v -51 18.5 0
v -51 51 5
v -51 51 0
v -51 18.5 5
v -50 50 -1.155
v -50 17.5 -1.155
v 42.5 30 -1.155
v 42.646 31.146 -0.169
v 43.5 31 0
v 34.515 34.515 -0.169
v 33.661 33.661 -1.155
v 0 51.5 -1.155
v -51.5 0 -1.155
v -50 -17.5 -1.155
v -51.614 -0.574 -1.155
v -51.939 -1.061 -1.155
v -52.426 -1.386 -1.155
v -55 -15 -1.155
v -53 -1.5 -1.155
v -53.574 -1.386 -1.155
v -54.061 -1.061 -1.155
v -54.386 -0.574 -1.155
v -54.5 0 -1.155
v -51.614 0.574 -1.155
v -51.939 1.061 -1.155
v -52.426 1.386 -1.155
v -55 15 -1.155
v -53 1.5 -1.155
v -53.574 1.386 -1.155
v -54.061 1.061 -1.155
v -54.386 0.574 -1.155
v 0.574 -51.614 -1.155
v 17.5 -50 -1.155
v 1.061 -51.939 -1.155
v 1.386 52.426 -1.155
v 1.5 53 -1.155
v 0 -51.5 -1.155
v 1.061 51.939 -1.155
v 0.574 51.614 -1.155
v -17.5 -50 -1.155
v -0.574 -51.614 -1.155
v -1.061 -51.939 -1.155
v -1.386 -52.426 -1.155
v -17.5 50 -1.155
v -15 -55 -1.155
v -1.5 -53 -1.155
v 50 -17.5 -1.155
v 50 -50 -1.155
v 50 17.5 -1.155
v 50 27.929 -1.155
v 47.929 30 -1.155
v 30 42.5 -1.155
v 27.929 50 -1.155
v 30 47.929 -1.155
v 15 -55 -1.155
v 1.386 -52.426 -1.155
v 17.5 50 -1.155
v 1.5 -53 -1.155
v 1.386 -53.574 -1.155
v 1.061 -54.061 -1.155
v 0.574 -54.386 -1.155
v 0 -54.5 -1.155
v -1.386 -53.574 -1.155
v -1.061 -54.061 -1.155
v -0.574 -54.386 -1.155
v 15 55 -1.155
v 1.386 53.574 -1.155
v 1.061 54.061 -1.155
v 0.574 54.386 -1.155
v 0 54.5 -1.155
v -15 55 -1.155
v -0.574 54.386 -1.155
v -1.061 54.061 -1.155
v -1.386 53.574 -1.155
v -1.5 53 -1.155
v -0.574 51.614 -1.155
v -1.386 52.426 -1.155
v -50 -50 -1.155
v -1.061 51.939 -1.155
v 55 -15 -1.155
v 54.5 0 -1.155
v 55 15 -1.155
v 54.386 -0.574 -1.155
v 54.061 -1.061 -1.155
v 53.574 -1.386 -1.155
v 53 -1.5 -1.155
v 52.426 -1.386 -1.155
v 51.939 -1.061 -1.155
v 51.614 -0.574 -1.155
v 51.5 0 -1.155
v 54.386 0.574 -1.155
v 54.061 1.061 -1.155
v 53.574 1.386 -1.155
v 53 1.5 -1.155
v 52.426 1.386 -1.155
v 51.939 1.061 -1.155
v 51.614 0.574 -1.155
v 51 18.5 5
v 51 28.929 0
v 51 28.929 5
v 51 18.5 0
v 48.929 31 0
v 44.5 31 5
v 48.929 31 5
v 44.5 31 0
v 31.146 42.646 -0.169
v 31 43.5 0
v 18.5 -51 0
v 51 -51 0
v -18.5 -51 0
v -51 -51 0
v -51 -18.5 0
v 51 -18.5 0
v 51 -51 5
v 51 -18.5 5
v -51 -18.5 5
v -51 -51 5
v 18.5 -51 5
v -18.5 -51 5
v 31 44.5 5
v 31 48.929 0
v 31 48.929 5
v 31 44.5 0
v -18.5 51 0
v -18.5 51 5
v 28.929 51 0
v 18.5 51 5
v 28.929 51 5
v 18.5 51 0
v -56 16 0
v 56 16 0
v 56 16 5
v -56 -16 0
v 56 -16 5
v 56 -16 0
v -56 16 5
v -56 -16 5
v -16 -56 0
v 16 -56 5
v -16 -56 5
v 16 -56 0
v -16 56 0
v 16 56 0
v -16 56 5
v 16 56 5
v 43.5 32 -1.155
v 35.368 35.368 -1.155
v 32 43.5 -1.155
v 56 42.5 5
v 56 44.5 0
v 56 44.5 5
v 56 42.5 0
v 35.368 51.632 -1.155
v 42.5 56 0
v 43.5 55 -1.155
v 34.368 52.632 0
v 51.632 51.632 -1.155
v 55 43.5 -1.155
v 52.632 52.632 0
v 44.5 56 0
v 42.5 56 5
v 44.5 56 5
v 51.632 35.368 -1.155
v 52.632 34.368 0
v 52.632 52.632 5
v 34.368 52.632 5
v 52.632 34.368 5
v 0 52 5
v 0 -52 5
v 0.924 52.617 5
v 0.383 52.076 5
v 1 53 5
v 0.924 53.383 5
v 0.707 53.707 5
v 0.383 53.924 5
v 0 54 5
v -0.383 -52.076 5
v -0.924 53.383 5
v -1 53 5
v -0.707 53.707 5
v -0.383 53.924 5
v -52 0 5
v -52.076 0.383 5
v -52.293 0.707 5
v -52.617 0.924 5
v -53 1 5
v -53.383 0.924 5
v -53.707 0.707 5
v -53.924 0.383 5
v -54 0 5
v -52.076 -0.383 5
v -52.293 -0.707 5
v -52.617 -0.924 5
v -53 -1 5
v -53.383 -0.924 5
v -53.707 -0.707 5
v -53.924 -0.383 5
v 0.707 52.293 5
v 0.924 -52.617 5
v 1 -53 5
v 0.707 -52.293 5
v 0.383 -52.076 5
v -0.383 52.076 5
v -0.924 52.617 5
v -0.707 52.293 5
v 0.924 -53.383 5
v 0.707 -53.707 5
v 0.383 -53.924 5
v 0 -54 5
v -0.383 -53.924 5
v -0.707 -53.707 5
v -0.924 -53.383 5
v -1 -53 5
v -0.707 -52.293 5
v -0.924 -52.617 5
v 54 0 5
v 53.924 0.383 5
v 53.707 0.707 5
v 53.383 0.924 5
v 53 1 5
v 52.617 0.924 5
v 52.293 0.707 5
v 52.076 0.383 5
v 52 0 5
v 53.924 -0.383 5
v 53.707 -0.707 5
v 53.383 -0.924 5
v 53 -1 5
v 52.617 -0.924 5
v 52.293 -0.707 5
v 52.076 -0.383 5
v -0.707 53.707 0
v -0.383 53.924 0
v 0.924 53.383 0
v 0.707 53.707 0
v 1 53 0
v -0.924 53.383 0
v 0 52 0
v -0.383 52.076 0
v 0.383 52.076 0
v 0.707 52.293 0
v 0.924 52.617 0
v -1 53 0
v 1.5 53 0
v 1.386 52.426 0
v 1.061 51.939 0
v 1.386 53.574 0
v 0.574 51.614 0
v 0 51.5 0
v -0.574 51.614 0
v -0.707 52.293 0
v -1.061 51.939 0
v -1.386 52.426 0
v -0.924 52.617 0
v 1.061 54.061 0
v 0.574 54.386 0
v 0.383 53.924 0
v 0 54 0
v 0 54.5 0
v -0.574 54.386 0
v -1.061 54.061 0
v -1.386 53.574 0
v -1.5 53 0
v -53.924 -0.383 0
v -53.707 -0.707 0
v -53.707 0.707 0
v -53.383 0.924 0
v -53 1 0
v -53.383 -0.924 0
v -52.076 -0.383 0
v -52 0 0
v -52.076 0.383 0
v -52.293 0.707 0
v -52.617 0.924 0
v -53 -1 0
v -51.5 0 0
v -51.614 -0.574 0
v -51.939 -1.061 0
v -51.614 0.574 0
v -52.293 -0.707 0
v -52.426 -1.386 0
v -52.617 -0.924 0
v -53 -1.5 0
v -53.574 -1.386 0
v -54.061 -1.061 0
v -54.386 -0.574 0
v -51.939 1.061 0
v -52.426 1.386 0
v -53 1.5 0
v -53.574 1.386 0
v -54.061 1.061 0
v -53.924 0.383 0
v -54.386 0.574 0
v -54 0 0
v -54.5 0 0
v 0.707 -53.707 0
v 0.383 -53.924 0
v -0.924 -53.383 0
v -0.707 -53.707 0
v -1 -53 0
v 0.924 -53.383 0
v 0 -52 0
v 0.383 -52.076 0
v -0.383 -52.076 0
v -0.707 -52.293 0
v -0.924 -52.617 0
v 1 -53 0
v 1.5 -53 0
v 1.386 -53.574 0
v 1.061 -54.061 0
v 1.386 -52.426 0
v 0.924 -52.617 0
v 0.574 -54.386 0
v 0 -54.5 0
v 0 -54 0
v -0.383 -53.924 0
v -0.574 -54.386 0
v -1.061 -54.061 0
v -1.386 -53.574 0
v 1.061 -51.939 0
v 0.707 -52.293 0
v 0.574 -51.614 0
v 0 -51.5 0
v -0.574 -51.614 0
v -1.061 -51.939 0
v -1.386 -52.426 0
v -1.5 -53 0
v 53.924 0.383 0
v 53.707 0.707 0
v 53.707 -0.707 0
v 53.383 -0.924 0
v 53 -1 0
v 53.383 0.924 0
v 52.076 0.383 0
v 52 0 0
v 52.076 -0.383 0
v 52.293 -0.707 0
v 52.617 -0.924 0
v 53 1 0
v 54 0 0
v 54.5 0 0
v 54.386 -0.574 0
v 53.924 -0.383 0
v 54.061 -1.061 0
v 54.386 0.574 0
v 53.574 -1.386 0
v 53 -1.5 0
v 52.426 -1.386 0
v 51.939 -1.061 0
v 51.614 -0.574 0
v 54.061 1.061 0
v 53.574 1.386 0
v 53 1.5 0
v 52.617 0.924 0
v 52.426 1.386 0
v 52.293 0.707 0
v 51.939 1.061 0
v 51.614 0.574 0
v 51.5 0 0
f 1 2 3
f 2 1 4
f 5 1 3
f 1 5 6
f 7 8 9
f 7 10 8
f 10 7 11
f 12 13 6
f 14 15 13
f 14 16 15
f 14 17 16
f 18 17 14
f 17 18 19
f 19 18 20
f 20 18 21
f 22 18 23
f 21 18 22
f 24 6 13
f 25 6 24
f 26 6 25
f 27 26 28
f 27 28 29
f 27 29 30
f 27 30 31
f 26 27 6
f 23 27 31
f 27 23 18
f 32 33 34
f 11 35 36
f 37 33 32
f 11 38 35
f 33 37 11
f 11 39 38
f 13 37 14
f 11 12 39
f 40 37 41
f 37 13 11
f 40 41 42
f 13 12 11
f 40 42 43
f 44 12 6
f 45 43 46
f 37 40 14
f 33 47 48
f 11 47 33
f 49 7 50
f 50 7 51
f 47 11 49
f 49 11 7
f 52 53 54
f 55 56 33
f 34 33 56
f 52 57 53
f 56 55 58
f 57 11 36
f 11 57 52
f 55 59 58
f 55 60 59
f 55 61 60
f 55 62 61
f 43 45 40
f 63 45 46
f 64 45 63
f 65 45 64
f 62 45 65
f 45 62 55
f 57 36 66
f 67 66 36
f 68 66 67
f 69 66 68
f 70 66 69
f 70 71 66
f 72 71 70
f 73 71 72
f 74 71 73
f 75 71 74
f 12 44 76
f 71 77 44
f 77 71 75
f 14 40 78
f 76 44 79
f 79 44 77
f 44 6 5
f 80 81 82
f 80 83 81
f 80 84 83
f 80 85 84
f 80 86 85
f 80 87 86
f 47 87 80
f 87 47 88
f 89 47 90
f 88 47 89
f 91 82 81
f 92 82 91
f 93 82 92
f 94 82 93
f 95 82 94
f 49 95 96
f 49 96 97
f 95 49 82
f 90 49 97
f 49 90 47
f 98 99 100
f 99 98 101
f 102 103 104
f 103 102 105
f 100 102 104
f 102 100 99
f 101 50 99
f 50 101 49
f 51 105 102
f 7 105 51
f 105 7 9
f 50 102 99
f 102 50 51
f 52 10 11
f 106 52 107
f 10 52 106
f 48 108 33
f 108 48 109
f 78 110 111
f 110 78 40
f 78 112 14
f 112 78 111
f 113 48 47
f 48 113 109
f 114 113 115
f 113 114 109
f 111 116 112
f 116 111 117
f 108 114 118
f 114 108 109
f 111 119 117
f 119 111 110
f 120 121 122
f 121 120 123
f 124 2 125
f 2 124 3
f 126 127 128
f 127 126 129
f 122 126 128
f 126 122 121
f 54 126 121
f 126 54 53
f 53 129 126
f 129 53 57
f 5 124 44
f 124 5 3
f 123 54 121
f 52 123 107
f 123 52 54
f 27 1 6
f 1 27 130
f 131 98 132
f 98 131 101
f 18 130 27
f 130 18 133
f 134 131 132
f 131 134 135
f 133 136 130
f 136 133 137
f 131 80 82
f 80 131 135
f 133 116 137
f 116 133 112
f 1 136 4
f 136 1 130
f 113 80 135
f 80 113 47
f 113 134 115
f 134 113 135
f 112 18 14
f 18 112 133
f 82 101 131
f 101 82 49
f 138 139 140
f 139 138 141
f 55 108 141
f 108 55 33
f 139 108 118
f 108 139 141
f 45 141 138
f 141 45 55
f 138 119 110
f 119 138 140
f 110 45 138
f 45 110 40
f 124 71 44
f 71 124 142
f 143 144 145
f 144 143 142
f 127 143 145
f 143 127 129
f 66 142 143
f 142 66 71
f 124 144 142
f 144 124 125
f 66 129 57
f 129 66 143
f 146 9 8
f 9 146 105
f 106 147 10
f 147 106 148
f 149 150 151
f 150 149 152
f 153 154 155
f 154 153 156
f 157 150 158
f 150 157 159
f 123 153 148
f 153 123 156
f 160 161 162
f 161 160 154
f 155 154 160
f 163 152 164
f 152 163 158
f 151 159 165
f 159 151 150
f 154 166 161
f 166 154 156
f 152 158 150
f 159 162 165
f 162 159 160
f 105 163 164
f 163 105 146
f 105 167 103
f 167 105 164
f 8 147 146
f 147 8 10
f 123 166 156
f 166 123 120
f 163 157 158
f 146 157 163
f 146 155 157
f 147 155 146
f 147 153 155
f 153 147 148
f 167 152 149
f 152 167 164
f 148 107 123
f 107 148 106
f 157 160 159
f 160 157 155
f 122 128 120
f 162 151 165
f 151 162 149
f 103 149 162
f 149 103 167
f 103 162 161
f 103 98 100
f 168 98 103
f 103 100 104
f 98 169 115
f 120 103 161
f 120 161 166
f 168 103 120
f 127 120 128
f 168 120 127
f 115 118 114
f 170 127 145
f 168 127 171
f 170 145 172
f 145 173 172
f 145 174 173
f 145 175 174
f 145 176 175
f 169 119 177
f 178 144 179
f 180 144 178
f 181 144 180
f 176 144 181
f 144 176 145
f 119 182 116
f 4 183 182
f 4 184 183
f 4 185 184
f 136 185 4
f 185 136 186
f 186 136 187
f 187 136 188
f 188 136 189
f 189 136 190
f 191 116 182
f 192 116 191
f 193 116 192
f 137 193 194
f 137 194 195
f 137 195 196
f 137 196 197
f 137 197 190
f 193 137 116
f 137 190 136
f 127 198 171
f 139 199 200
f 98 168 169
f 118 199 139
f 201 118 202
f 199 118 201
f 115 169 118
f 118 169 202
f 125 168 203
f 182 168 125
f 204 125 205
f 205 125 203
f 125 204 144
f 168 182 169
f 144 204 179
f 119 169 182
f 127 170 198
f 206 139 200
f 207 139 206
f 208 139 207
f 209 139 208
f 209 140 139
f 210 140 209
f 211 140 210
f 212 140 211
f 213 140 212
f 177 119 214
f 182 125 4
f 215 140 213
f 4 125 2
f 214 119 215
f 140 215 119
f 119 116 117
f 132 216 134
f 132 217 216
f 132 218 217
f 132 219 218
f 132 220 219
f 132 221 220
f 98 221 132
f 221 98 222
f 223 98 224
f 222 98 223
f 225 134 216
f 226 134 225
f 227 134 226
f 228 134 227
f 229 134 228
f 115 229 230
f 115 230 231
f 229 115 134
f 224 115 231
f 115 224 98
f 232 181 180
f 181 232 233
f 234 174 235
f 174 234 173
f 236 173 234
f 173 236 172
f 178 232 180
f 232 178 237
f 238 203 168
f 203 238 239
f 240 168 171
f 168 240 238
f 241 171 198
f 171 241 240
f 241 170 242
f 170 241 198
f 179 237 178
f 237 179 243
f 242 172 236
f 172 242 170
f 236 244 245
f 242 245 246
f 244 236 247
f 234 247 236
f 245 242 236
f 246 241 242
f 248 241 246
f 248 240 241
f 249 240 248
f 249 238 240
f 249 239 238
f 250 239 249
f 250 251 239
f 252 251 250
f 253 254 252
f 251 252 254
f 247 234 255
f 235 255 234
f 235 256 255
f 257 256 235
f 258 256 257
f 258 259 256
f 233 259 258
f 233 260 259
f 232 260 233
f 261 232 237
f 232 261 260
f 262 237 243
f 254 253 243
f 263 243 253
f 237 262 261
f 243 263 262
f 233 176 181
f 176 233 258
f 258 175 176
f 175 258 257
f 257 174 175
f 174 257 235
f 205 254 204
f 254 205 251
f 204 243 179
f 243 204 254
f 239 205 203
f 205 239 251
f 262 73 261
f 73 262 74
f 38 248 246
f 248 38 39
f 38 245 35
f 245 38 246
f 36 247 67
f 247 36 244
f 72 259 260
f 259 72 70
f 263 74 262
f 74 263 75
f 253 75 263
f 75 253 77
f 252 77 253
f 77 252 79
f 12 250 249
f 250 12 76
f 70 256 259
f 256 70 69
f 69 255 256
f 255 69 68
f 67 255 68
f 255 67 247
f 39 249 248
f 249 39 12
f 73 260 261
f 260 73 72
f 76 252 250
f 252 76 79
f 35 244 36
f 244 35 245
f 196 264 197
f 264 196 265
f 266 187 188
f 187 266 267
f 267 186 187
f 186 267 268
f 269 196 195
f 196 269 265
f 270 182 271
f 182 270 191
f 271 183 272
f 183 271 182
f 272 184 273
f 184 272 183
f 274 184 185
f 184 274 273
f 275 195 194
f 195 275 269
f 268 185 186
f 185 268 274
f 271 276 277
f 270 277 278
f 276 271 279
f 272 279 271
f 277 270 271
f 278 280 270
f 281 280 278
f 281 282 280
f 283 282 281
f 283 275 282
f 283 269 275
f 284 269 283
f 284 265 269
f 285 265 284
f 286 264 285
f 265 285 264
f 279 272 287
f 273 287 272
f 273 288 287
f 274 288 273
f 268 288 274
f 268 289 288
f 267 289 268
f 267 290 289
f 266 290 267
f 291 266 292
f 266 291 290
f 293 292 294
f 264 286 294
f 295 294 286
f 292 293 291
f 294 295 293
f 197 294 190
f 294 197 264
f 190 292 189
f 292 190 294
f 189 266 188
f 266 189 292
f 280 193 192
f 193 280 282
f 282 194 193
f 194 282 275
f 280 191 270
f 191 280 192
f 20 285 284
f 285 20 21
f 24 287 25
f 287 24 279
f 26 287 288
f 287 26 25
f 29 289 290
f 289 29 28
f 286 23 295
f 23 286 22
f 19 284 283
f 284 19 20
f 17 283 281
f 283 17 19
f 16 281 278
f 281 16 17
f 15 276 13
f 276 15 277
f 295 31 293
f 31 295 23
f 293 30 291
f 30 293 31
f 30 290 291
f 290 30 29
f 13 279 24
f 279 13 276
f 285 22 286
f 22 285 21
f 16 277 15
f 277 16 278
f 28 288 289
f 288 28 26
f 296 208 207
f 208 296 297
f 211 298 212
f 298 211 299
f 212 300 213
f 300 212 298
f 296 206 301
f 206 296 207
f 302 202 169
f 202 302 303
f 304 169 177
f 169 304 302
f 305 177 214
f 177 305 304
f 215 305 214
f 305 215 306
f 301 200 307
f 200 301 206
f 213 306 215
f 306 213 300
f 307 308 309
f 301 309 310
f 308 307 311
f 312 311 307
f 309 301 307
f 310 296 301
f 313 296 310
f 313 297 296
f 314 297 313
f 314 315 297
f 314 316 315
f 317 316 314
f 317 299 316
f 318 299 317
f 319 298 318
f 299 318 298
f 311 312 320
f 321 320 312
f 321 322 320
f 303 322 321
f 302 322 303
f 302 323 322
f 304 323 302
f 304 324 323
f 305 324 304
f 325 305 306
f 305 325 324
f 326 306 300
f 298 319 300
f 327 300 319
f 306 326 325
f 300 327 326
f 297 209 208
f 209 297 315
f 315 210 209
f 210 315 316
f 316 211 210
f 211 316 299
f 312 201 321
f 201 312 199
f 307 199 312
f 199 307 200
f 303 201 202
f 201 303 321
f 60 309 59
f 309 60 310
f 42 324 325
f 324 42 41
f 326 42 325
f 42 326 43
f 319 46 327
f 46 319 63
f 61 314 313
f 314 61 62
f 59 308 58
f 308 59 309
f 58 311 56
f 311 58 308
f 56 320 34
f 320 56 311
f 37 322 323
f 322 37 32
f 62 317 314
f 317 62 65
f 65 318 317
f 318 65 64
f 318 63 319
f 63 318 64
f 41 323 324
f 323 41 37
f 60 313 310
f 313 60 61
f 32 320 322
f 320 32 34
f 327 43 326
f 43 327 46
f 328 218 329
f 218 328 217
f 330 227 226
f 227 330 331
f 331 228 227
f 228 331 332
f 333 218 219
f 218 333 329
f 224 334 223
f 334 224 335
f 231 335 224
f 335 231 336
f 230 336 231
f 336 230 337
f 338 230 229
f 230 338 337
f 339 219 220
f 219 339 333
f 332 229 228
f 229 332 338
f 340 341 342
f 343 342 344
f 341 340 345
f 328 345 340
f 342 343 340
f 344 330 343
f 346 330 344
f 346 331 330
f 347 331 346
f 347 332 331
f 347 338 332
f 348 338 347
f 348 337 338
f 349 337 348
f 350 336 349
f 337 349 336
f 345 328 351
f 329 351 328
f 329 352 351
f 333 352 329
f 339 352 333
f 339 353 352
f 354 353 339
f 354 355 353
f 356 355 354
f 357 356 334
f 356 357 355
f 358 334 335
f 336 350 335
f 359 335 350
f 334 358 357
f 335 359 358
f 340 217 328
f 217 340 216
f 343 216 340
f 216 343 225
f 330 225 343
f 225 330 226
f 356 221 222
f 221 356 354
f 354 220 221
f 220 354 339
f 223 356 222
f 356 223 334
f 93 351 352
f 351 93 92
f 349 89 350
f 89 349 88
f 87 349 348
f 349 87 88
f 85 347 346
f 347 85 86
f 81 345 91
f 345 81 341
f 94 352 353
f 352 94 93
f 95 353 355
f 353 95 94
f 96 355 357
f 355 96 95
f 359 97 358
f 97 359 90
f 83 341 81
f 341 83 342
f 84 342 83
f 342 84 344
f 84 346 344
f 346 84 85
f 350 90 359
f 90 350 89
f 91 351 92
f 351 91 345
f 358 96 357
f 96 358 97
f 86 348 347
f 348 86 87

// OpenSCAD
// UBomb

module_l = 100;
module_d = 30;
module_indent_w = 30;
module_indent_d = 5;
module_lighit_d = 25;
module_lighit_cut = 5;
module_internal_wall = 5;

moudle_light_d_1 = 25;
moudle_light_d_2 = 10;
moudle_light_reduction = 0.7;
moudle_light_diamater = 7;

module_screw_cap_d = 5;

rounding = 2;

light_center = module_l/2 + module_indent_d - module_lighit_d/2 + rounding/2;


body_n = 3; // numer of modules on x
body_m = 2; // mods on y
body_separator_w = 5;
body_separator_d = 25;
body_shell_thick = 7;
body_shell_d = 30;

module Screw ( ) {
    cylinder (d=2,h=10,$fn = 16 );
    mirror ( [ 0,0,1] )
    cylinder (d=3,h=10,$fn = 16 );
}

// screws positioning
module SModule ( )
{
    for ( i = [0:3])
    rotate ( 90*i )
    translate ( [0,module_l/2+(module_indent_d+rounding/2)/2])
    Screw();
}

module IcoSphere ( d = rounding )
{
    union ( )
    { 
        linear_extrude ( d/sqrt(3), scale = 0 )
        square ( d, center = true );
        mirror ([0,0,1])
        linear_extrude ( d/sqrt(3), scale = 0 )
        square ( d, center = true );
    }
}

module ModuleShape ( )
{
    union ( )
    {
        // corpo centrale
        linear_extrude ( module_d, center = true )
        difference ( )
        {
            square ( module_l, center = true );
            
            // light cut out
            light_center = module_l/2 + module_indent_d - module_lighit_d/2;
            translate ( [light_center,light_center] )
            union ( )
            {
                circle ( d = module_lighit_d, $fn = 8 );
                
                translate ( [-module_lighit_d/2,0])
                square ( module_lighit_d );
                translate ( [0,-module_lighit_d/2] )
                square ( module_lighit_d );
                
                rotate ( 45, [0,0,1] )
                translate ( [-module_lighit_cut,-module_lighit_d*2])
                square ( module_lighit_d*4 );
            }
        }
        
        // indents laterali
        for ( i = [ 1:4 ] ) 
        {
            rotate ( 90*i, [0,0,1])
            translate ( [0,module_l/2])
            rotate ( -90,[1,0,0] )
            linear_extrude ( module_indent_d, scale = [(module_indent_w)/(module_indent_d+module_indent_w),1] )
            square ( [ module_indent_w + module_indent_d, module_d], center = true );
        }
    }
}

// body of the module
module BModule ( )
{
    color ( "blue" )
    difference ( ) 
    {
        union ( )
        {
            minkowski ( )
            {
                ModuleShape ( );
                IcoSphere ( );
            }
            
            
            // light stand
            translate ( [light_center,light_center,-(moudle_light_d_2-module_d)/2] )
            minkowski ( )
            {
                union ( )
                {
                    diam = module_lighit_d-rounding;
                    linear_extrude ( moudle_light_d_2, scale = moudle_light_reduction )
                    circle ( d=diam, $fn = 8 );
                    rotate (180,[1,0,0])
                    cylinder (d=diam, h = moudle_light_d_1, $fn = 8 );
                }
                IcoSphere ( );
            }
            
            
        }
        
        // internal
        translate ( [0,0,-module_internal_wall/2 - rounding/2 ] )
        linear_extrude ( module_d - module_indent_d + rounding, center = true )
        offset ( -module_internal_wall, $fn = 12 )
        projection(cut = true) ModuleShape ( );
        
        // light
        translate ( [light_center,light_center,-moudle_light_diamater/2] )
        cylinder ( d=moudle_light_diamater,h = moudle_light_d_1+moudle_light_d_2, $fn = 8 );
        
        translate ( [light_center,light_center] )
        rotate ( 180+45,[0,0,1])
        rotate ( 90,[0,1,0])
        cylinder ( d=moudle_light_diamater,h = moudle_light_d_1+moudle_light_d_2, $fn = 4 );
        
        // remove bottom to make it flat 
        translate ( [0,0,-module_l-module_d/2+module_screw_cap_d])
        cube ( module_l*2,center = true );
    }
};

// bottom lid or cap
module CModule ( )
{
    color ( "red" )
    difference ( ) {
        union ( ) {
            minkowski ( )
            {
                ModuleShape ( );
                IcoSphere ( );
            }
            // light stand
            translate ( [light_center,light_center,0] )
            minkowski ( )
            {
                diam = module_lighit_d-rounding;
                cylinder (d=diam, h = module_d, $fn = 8, center = true );
                IcoSphere ( );
            }
        }
        
        // remove top to make it flat 
        translate ( [0,0,module_l-module_d/2+module_screw_cap_d])
        cube ( module_l*2,center = true );
    }
}

clip_diametro = 3;
clip_spessore = 0.62;
clip_lunghezz = 15;

clip_attach_h = 1.2;
clip_attach_d = 6;
clip_attach_w = 5;

module PClip ( ) {
    circle ( d = clip_diametro, $fn = 20 );
    translate ( [0,-clip_lunghezz/2] )
    square ( [clip_diametro,clip_lunghezz], center = true );
    
    translate ( [ clip_diametro/2, -clip_attach_d-clip_attach_w] )
    polygon ( [
        [0,0],
        [0,clip_attach_w],
        [clip_attach_h,clip_attach_w-clip_attach_h],
        [clip_attach_h,clip_attach_h]
    ] );
    
}

module Clip ( thick = 1 )
{
    rotate ( 90,[1,0,0] )
    difference ( )
    {
        translate ( [clip_diametro/2-clip_spessore,0] ) 
        linear_extrude ( thick )
        difference ( ) 
        {
            PClip ( );
            
            offset ( -clip_spessore, $fn = 20 )
            PClip ( );
            
            // bottom joint
            translate ( [0,-clip_lunghezz])
            square ( clip_diametro, center = true );
            
        }
        // bottom smoothing
        
        for ( i = [0,1] )
        {
            translate ( [0,0,thick*i])
            translate ( [0,-clip_lunghezz+clip_diametro/2] )
            rotate ( - 90 - 90 * i, [1,0,0])
            rotate ( 90, [0,1,0])
            translate ( [-clip_diametro,-clip_diametro]/2 )
            difference ( ) 
            {
                cube ( clip_diametro );
                cylinder ( d = clip_diametro, h = clip_diametro,$fn = 12 );
            }
        }
    }
}

normal_clip_w = 30;
small_clip_w = 10;
clip_pading = 5;
tollerance = 0.3;

// with tollence
larghezza_modulo = module_l + module_indent_d*2 + rounding + tollerance*2;

module Separator ( segments, vertical_cut = 1 )
{
    lungezza = ( larghezza_modulo ) * segments + body_separator_w * ( segments - 1 );
    difference ( )
    {
        union ( )
        {
            minkowski ( ) {
                translate ( [0,1/2,1/sqrt(3)]*rounding )
                cube ( [ body_separator_w-rounding/2, lungezza-rounding, body_separator_d -rounding * 2 / sqrt(3) ] );
                IcoSphere ( );
            }
        
            // clips 
            for ( i = [1:segments] )
            {
                translate ( [ 0,
                    larghezza_modulo*i+ body_separator_w * ( i - 1 ),
                    body_separator_d
                ] )
                union ( )
                {   
                    translate ( [0,-clip_pading] )
                    {
                        mirror ( [1,0,0] )
                        Clip ( normal_clip_w );
                        
                        translate ( [body_separator_w,0] )
                        Clip ( normal_clip_w );
                    }
                    
                    translate ( [0,-larghezza_modulo+clip_pading+normal_clip_w] )
                    {
                        mirror ( [1,0,0] )
                        Clip ( normal_clip_w );
                        
                        
                        translate ( [body_separator_w,0] )
                        Clip ( small_clip_w );
                    }
                }
            }
        }
        
        
        // cuts
        for ( i = [0:segments] )
        {
            translate ( [-body_separator_w/2,
                larghezza_modulo * i + body_separator_w * ( i - 1 ),
                ( vertical_cut * body_separator_d / 2 )
            ] )
            cube ( [body_separator_w*2,body_separator_w, body_separator_d / 2 ]);
        }
    }
}

module Box ( n,m )
{   
    difference ( )
    {
        minkowski ( )
        {
            difference ( )
            {
                cube ( [ 
                    larghezza_modulo * n + body_separator_w * ( n - 1 ) + body_shell_thick * 2,
                    larghezza_modulo * m + body_separator_w * ( m - 1 ) + body_shell_thick * 2,
                    body_shell_d ]
                );
                translate ( [body_shell_thick,body_shell_thick,body_shell_thick])
                cube ( [ 
                    larghezza_modulo * n + body_separator_w * ( n - 1 ),
                    larghezza_modulo * m + body_separator_w * ( m - 1 ),
                    body_shell_d ]
                );
            }
            IcoSphere ( );
        }
        translate ( [-1,-1]*body_shell_thick/2)
        mirror ( [ 0,0,1 ] )
        cube ( [ 
            larghezza_modulo * n + body_separator_w * ( n - 1 ) + body_shell_thick * 3,
            larghezza_modulo * m + body_separator_w * ( m - 1 ) + body_shell_thick * 3,
            body_shell_d ]
        );
    }
    
}

// Box ( 2,3 );

// Separator ( 3 );

// translate ( [-1,1,0] * (module_l/2+module_indent_d+rounding/2 + tollerance) )
// BModule ( );


difference ( )
{
    translate ( [0,0,body_shell_d/2])
    CModule ( );
    SModule ( );
}
